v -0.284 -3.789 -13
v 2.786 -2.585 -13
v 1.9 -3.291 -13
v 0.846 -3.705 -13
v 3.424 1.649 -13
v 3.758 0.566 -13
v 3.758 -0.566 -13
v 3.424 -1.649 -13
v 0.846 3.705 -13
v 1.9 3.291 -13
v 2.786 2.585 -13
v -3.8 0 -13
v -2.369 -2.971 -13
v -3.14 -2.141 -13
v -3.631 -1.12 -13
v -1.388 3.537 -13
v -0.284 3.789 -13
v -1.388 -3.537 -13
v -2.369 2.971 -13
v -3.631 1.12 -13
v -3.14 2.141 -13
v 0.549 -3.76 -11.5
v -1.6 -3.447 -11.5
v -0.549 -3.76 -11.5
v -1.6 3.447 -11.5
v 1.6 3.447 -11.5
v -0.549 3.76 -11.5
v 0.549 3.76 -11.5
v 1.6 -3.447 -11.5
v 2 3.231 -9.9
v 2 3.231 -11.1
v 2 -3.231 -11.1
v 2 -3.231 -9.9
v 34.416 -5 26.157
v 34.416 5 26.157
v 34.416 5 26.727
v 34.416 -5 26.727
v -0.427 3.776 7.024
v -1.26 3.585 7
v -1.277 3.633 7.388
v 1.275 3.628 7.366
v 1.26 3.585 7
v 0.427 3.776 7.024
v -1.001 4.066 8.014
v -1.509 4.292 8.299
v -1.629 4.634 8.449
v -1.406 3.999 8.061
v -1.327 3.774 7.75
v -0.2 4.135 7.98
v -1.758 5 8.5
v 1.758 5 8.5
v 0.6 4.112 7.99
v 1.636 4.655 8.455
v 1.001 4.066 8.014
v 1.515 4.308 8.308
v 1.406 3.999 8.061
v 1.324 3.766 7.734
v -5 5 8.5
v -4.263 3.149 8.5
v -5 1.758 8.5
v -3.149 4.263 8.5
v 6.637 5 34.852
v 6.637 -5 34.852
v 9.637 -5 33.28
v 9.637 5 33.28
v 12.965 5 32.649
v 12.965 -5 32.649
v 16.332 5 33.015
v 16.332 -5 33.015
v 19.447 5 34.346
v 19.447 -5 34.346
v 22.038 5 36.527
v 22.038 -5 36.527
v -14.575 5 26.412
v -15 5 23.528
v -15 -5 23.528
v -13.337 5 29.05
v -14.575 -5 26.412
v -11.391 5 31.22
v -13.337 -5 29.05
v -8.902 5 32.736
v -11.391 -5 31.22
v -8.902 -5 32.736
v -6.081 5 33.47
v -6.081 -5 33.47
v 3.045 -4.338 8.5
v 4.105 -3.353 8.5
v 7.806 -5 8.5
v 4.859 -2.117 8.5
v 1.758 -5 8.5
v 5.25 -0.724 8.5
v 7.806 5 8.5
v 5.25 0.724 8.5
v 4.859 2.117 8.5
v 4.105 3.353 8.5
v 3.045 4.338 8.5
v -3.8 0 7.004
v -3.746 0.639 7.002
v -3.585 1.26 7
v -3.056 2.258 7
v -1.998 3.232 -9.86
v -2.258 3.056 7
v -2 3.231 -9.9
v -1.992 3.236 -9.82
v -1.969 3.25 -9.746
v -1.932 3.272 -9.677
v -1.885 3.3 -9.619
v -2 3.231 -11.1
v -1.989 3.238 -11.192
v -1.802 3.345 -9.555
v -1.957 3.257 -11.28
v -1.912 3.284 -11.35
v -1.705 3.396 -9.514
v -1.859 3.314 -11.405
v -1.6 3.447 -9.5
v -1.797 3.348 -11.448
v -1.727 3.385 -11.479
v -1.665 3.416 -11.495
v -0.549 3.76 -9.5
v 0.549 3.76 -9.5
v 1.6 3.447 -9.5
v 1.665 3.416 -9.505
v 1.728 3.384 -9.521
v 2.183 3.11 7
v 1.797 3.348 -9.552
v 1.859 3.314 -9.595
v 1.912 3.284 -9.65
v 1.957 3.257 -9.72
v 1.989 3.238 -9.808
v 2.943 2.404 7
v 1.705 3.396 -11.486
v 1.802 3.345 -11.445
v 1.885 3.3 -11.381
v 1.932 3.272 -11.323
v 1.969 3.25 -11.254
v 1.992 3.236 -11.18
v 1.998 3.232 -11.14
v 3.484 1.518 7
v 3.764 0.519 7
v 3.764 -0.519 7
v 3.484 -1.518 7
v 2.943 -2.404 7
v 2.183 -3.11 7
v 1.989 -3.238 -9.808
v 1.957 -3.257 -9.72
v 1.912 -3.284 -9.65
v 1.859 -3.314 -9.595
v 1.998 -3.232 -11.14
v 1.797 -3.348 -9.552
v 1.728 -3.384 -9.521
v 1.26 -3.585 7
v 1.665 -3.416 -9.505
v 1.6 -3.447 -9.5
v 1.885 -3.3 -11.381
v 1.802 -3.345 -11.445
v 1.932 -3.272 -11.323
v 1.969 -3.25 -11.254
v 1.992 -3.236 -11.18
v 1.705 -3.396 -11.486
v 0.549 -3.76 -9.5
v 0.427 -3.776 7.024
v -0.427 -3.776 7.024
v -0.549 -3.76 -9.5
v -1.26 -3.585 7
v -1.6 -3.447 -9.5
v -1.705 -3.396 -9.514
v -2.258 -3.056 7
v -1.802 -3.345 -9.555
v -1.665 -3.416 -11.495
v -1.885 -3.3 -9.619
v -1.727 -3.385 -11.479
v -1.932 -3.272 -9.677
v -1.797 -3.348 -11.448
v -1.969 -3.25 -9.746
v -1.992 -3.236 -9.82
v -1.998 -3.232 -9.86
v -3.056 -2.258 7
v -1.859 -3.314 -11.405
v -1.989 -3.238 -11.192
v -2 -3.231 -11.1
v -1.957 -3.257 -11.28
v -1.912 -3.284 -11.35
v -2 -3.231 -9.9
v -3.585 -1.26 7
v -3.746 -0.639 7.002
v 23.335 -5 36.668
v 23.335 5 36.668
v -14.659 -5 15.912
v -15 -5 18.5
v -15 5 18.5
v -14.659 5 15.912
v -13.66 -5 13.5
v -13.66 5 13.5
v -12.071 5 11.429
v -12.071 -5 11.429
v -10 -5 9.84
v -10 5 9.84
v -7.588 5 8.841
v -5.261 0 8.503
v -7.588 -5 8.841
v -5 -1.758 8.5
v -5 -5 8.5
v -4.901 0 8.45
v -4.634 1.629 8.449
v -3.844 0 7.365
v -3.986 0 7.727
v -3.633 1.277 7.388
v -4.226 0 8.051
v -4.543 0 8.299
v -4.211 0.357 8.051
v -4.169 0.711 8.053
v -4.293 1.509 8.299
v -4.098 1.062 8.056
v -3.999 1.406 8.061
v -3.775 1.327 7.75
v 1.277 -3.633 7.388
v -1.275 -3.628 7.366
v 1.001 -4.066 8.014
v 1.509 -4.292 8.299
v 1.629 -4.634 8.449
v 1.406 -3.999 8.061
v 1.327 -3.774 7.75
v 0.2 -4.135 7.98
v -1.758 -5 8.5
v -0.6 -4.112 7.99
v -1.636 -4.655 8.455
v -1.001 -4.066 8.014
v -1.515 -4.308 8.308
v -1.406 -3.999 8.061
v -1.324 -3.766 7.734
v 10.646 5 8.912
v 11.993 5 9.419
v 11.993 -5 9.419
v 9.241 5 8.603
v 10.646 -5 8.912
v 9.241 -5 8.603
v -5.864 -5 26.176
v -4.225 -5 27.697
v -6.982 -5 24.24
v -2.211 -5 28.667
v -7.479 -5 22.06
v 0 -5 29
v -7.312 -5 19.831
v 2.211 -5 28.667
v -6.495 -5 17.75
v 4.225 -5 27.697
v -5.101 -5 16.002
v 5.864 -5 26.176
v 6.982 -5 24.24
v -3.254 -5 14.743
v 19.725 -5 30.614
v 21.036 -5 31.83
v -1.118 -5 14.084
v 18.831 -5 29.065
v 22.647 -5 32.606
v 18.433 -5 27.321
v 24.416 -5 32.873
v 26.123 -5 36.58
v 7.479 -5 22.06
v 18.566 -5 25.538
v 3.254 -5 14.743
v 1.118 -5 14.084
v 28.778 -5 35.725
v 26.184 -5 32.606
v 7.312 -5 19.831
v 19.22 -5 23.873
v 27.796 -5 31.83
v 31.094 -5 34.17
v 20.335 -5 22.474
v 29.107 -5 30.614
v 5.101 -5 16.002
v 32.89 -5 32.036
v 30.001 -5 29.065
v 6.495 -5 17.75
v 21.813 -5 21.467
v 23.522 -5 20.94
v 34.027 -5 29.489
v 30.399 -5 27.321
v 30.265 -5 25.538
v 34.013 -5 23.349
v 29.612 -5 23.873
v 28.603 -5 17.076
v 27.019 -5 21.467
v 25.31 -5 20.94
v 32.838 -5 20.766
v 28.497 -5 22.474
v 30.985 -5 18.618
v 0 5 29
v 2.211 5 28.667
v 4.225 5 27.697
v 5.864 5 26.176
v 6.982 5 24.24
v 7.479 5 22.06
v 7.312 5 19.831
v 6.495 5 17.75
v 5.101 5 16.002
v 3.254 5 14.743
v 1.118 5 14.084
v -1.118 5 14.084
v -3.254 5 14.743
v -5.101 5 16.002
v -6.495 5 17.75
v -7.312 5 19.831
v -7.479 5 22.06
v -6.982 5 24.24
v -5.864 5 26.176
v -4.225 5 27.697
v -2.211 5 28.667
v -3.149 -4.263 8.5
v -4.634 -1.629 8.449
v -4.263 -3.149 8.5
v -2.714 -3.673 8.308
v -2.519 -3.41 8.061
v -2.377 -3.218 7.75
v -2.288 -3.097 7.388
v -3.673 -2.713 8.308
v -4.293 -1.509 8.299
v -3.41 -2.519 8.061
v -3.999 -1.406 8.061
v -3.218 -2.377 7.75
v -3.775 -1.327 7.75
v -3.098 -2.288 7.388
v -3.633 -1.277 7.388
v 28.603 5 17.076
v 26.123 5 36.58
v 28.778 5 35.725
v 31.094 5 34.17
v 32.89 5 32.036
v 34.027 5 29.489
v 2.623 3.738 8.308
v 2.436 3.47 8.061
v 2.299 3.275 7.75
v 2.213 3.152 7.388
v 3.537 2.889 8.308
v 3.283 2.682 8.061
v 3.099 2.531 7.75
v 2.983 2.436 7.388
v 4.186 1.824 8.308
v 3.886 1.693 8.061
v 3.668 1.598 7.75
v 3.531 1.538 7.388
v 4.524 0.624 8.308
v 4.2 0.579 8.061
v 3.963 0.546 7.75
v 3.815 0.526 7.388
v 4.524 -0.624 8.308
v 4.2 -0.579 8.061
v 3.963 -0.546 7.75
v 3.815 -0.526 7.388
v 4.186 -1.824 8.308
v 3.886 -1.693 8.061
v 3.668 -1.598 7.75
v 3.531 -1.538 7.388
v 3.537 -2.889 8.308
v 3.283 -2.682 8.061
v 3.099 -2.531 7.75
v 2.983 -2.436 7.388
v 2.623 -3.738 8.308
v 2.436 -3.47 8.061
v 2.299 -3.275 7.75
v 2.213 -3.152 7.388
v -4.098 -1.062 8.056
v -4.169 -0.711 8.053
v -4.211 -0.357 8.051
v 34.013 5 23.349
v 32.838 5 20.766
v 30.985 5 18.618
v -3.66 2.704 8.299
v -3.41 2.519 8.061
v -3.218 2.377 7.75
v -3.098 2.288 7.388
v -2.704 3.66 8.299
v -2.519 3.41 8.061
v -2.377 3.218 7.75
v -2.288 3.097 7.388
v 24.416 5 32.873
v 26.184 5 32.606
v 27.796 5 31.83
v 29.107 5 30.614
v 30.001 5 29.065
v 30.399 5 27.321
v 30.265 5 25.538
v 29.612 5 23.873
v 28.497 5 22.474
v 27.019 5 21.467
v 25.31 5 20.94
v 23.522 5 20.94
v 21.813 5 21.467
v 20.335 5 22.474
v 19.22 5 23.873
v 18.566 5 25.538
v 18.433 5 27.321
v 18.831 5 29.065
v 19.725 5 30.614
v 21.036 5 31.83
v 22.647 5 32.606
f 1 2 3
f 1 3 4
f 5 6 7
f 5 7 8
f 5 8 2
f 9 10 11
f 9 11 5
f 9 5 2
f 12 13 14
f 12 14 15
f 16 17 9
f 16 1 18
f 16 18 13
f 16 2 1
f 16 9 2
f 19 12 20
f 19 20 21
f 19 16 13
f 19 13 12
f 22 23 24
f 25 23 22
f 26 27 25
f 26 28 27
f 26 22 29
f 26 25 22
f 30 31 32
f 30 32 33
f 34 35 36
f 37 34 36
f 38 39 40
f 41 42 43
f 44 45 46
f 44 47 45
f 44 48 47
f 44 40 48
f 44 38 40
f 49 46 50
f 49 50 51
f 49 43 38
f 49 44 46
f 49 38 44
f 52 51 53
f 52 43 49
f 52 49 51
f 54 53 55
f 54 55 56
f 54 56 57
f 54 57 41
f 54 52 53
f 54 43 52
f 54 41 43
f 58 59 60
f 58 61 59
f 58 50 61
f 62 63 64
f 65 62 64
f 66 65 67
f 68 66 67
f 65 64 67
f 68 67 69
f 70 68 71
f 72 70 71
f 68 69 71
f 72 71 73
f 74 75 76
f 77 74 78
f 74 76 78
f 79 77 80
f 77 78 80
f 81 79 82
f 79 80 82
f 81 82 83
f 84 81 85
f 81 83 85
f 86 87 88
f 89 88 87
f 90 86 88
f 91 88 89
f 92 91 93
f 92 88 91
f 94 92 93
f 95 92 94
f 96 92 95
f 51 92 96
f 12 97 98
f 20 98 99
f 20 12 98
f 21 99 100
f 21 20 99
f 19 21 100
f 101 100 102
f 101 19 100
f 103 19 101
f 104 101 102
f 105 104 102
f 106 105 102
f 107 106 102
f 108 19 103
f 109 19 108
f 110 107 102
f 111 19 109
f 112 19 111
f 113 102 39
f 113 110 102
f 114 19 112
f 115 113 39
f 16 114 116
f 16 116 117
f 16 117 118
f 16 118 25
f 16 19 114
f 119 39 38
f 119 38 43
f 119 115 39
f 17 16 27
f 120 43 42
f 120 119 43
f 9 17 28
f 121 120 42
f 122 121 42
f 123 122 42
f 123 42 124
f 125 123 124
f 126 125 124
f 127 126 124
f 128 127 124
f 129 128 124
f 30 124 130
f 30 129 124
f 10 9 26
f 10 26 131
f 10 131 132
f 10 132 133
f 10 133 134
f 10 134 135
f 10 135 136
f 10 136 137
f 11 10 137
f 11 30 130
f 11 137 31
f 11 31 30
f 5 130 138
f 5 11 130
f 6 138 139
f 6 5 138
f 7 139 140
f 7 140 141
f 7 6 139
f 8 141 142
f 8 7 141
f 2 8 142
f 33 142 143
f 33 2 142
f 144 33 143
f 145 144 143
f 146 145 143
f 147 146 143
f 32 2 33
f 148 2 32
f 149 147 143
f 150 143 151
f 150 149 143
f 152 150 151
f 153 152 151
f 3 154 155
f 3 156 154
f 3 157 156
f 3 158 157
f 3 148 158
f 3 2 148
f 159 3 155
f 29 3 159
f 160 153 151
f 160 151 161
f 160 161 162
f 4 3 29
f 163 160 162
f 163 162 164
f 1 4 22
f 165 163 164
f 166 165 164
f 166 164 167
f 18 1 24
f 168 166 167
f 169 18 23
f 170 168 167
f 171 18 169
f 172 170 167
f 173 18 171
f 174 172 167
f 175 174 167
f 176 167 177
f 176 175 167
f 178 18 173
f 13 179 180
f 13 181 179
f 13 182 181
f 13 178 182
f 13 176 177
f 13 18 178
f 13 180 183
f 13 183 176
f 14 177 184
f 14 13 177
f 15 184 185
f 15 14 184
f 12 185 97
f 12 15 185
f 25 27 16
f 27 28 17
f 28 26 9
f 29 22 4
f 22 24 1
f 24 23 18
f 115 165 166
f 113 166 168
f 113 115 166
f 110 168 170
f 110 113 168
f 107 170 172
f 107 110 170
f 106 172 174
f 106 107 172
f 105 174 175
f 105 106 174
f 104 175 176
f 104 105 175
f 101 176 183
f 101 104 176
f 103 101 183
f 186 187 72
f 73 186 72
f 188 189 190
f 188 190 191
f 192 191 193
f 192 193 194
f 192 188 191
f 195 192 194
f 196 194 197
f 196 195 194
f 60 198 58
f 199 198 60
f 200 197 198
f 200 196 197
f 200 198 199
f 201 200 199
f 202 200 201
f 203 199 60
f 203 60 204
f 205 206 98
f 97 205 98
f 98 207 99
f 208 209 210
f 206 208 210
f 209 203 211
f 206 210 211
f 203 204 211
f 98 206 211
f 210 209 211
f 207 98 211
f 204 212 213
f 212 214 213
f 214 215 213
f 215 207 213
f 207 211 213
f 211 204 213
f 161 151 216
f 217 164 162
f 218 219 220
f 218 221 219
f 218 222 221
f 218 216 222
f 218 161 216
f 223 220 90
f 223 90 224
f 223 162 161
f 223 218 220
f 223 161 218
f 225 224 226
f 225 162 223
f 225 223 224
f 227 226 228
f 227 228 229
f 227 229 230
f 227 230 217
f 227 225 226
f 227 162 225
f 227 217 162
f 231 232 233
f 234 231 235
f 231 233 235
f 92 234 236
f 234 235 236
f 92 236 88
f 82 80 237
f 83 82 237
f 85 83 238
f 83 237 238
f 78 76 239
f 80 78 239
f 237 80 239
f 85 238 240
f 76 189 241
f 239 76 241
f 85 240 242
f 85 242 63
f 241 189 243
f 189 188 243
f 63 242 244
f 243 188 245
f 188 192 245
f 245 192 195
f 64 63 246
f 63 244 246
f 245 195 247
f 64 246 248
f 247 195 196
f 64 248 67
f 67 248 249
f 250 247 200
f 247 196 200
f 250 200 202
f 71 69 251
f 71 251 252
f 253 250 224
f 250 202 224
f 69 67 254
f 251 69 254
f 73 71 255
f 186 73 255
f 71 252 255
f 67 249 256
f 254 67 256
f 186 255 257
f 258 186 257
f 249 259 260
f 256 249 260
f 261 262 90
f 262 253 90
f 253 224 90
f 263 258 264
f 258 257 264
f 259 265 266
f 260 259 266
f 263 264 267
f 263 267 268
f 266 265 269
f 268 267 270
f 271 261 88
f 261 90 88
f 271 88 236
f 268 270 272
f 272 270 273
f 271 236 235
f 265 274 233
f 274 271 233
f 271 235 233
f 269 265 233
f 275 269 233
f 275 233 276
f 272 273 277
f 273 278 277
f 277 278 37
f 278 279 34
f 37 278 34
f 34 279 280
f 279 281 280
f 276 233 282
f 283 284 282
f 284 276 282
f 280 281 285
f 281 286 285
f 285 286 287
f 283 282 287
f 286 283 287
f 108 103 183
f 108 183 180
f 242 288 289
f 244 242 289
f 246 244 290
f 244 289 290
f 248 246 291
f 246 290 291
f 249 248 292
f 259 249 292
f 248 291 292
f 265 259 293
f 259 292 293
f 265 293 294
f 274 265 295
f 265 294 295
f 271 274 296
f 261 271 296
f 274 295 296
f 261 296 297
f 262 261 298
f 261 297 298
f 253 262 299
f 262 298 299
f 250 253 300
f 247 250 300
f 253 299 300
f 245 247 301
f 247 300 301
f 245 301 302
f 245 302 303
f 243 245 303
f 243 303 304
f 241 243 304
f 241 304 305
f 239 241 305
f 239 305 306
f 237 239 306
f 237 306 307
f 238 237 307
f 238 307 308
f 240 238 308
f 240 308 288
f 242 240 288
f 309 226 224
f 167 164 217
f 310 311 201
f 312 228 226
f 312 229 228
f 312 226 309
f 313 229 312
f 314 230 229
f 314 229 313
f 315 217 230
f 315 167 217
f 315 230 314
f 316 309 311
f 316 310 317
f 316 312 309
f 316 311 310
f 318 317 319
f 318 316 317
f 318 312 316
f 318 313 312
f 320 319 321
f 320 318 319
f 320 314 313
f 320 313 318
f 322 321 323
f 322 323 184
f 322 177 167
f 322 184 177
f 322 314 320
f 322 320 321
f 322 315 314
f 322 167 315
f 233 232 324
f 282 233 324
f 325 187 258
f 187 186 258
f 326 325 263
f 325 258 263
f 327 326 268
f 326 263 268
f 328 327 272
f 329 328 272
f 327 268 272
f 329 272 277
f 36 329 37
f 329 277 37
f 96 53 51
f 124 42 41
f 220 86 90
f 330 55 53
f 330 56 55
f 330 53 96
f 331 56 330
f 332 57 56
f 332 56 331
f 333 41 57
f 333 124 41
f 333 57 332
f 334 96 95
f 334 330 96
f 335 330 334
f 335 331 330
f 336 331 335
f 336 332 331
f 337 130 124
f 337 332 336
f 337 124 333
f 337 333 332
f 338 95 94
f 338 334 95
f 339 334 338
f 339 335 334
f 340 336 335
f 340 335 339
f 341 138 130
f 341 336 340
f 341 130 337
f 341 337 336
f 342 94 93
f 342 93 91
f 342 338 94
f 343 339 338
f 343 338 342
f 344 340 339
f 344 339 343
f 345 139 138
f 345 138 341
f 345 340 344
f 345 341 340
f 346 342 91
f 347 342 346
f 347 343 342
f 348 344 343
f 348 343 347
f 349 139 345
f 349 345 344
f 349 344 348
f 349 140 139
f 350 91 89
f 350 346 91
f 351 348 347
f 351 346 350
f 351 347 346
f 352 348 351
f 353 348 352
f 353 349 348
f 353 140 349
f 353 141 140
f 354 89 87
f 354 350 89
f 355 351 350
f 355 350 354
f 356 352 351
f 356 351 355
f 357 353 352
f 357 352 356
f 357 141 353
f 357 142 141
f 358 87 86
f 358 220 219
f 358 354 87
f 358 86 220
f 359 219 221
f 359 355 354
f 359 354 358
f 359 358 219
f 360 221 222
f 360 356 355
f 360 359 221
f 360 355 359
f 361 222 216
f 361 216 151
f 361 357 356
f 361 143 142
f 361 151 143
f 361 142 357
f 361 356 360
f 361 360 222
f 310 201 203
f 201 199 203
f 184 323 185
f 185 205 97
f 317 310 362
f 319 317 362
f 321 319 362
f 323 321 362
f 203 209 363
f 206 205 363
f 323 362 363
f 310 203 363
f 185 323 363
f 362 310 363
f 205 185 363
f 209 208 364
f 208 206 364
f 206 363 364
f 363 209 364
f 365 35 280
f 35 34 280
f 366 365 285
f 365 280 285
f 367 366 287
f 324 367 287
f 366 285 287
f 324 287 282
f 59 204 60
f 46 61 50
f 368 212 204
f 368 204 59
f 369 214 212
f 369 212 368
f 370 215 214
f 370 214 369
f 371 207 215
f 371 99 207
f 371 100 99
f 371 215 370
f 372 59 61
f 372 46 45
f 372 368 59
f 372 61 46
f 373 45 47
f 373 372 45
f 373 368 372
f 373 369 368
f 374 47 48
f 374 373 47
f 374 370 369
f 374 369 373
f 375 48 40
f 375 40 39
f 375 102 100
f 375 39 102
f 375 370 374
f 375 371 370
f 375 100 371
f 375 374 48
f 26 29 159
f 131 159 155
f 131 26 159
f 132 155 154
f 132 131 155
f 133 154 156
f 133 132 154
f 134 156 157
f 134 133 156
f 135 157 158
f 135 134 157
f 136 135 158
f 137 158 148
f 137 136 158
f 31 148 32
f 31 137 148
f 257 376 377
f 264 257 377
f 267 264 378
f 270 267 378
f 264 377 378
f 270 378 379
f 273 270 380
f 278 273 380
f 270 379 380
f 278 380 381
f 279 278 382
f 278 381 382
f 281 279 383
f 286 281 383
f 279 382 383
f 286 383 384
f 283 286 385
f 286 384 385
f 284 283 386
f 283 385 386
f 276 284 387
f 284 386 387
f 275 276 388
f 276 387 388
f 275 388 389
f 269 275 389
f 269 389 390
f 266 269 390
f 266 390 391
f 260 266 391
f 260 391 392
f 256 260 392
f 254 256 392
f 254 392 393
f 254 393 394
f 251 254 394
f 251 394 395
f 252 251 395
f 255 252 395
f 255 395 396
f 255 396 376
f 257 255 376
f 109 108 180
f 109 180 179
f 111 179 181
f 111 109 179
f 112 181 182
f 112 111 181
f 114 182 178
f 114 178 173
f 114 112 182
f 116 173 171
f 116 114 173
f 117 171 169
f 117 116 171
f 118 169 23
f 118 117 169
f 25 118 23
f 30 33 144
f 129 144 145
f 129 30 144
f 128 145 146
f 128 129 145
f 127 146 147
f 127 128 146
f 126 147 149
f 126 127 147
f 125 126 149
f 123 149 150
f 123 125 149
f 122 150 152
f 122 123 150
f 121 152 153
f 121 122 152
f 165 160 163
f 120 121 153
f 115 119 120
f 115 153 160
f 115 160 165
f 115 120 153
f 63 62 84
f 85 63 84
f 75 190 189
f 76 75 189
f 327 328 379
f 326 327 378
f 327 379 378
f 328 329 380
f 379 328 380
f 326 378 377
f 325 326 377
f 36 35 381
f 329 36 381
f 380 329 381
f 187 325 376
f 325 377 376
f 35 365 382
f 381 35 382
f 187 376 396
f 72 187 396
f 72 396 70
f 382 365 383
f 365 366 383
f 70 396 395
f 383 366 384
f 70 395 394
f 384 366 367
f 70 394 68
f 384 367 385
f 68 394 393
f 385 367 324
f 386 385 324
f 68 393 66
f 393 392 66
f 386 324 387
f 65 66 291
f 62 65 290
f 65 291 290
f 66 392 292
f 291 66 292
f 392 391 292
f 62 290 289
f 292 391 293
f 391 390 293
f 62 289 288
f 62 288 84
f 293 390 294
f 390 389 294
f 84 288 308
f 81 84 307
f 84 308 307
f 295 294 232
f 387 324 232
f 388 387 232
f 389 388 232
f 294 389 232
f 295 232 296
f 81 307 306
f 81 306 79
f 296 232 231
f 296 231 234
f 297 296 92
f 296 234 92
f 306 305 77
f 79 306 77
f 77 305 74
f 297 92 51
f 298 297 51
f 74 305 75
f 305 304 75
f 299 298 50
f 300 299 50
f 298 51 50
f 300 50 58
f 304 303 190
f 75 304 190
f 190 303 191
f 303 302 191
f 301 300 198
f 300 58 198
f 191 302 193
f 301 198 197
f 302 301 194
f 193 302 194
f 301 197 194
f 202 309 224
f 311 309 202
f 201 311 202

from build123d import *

# Parameters (mm, degrees)
SKETCH1_R           = 5
BOSS_EXTRUDE1_DEPTH = 20
SKETCH2_R           = 5
SKETCH2_R_2         = 3.98
CUT_EXTRUDE2_DEPTH  = 8
SKETCH8_R           = 5
BOSS_EXTRUDE2_DEPTH = 20
BOSS_EXTRUDE3_START = -31.5
BOSS_EXTRUDE3_DEPTH = 31.5
BOSS_EXTRUDE4_START = -31.5
BOSS_EXTRUDE4_DEPTH = 31.5
SKETCH12_R          = 7.5
SKETCH12_R_2        = 6
CUT_EXTRUDE3_DEPTH  = 31.5
CUT_EXTRUDE4_DEPTH  = 55.083269132
FILLET1_R           = 10
BOSS_EXTRUDE5_START = 13
SKETCH17_R          = 3.98
BOSS_EXTRUDE5_DEPTH = 13
CUT_EXTRUDE5_DEPTH  = 52.315568407
SKETCH19_R          = 5
SKETCH19_R_2        = 3.98
CUT_EXTRUDE6_DEPTH  = 0.5
SKETCH20_R          = 3.98
SKETCH20_R_2        = 3.8
CUT_EXTRUDE7_DEPTH  = 21.5
FILLET2_R           = 1.5
CUT_EXTRUDE9_DEPTH  = 10


with BuildPart() as part:
    # Sketch1 → Boss-Extrude1 (new body)
    with BuildSketch(Plane.XY):
        Circle(SKETCH1_R)
    extrude(amount=BOSS_EXTRUDE1_DEPTH)

    # Sketch2 → Cut-Extrude2 (cut)
    with BuildSketch(Plane(origin=(0, 0, 0), x_dir=(-1, 0, 0), z_dir=(0, 0, -1))):
        Circle(SKETCH2_R)
        Circle(SKETCH2_R_2, mode=Mode.SUBTRACT)
    extrude(amount=-CUT_EXTRUDE2_DEPTH, mode=Mode.SUBTRACT)

    # Sketch8 → Boss-Extrude2 (add)
    with BuildSketch(Plane.XY.offset(20)):
        with Locations(Location((0, 0, 0), (0, 0, 180))):
            Circle(SKETCH8_R)
    extrude(amount=BOSS_EXTRUDE2_DEPTH)

    # Sketch9 → Boss-Extrude3 (add)
    with BuildSketch(Plane.XY.offset(40).offset(BOSS_EXTRUDE3_START)):
        with BuildLine():
            Line((0, 5), (35, 5))
            Line((35, 5), (35, -5))
            Line((35, -5), (0, -5))
            ThreePointArc((0, -5), (5, 0), (0, 5))
        make_face()
    extrude(amount=BOSS_EXTRUDE3_DEPTH)

    # Sketch10 → Boss-Extrude4 (add)
    with BuildSketch(Plane.XY.offset(40).offset(BOSS_EXTRUDE4_START)):
        with BuildLine():
            ThreePointArc((0, -5), (-5, 0), (0, 5))
            Line((0, 5), (-15, 5))
            Line((-15, 5), (-15, -5))
            Line((-15, -5), (0, -5))
        make_face()
    extrude(amount=BOSS_EXTRUDE4_DEPTH)

    # Sketch12 → Cut-Extrude3 (cut)
    with BuildSketch(Plane(origin=(0, 5, 0), x_dir=(1, 0, 0), z_dir=(0, 1, 0))):
        with Locations(Location((0, -21.5, 0), (0, 0, 270))):
            Circle(SKETCH12_R)
        with Locations(Location((24.415869627, -26.872644634, 0), (0, 0, 270))):
            Circle(SKETCH12_R_2)
    extrude(amount=-CUT_EXTRUDE3_DEPTH, mode=Mode.SUBTRACT)

    # Sketch14 → Cut-Extrude4 (cut, through all)
    with BuildSketch(Plane(origin=(0, 5, 0), x_dir=(1, 0, 0), z_dir=(0, 1, 0))):
        Polygon((-15, -40), (35, -40), (35, -37.368304137), (35, -8.5), (10, -8.5), (34.415869627, -19.756213623), (34.415869627, -37.872644634), (-15, -32.5), align=None)
    extrude(amount=-CUT_EXTRUDE4_DEPTH, mode=Mode.SUBTRACT)

    # Fillet1
    fillet1_edges = [part.edges().sort_by_distance(p)[0] for p in [
        (-15, 0, 8.5),
        (34.415869627, 0, 19.756213623),
        (10, 0, 8.5),
        (-15, 0, 32.5),
        (34.415869627, 0, 37.872644634),
    ]]
    fillet(fillet1_edges, radius=FILLET1_R - 0.0001)  # a hair under: the kernel refuses the full size

    # Sketch17 → Boss-Extrude5 (add)
    with BuildSketch(Plane(origin=(0, 0, 0), x_dir=(-1, 0, 0), z_dir=(0, 0, -1)).offset(BOSS_EXTRUDE5_START)):
        Circle(SKETCH17_R)
    extrude(amount=-BOSS_EXTRUDE5_DEPTH)

    # Sketch18 → Cut-Extrude5 (cut, through all)
    with BuildSketch(Plane(origin=(0, 5, 0), x_dir=(1, 0, 0), z_dir=(0, 1, 0))):
        with BuildLine():
            Line((-1.6, 11.5), (1.6, 11.5))
            ThreePointArc((1.6, 11.5), (1.882842712, 11.382842712), (2, 11.1))
            Line((2, 11.1), (2, 9.9))
            ThreePointArc((2, 9.9), (1.882842712, 9.617157288), (1.6, 9.5))
            Line((1.6, 9.5), (-1.6, 9.5))
            ThreePointArc((-1.6, 9.5), (-1.882842712, 9.617157288), (-2, 9.9))
            Line((-2, 9.9), (-2, 11.1))
            ThreePointArc((-2, 11.1), (-1.882842712, 11.382842712), (-1.6, 11.5))
        make_face()
    extrude(amount=-CUT_EXTRUDE5_DEPTH, mode=Mode.SUBTRACT)

    # Sketch19 → Cut-Extrude6 (cut)
    with BuildSketch(Plane(origin=(0, 0, 8), x_dir=(-1, 0, 0), z_dir=(0, 0, -1))):
        Circle(SKETCH19_R)
        Circle(SKETCH19_R_2, mode=Mode.SUBTRACT)
    extrude(amount=-CUT_EXTRUDE6_DEPTH, mode=Mode.SUBTRACT)

    # Sketch20 → Cut-Extrude7 (cut)
    with BuildSketch(Plane(origin=(0, 0, -13), x_dir=(-1, 0, 0), z_dir=(0, 0, -1))):
        Circle(SKETCH20_R)
        Circle(SKETCH20_R_2, mode=Mode.SUBTRACT)
    extrude(amount=-CUT_EXTRUDE7_DEPTH, mode=Mode.SUBTRACT)

    # Fillet2
    fillet2_edges = [part.edges().sort_by_distance(p)[0] for p in [
        (3.8, 0, 8.5),
    ]]
    fillet(fillet2_edges, radius=FILLET2_R)

    # Sketch21 → Cut-Extrude9 (cut)
    with BuildSketch(Plane.XZ.offset(5)):
        with BuildLine():
            Line((22.038458054, 36.526934554), (6.637283612, 34.852471718))
            ThreePointArc((6.637283612, 34.852471718), (14.662129167, 32.707278529), (22.038458054, 36.526934554))
        make_face()
    extrude(amount=-CUT_EXTRUDE9_DEPTH, mode=Mode.SUBTRACT)


solid = part.part
